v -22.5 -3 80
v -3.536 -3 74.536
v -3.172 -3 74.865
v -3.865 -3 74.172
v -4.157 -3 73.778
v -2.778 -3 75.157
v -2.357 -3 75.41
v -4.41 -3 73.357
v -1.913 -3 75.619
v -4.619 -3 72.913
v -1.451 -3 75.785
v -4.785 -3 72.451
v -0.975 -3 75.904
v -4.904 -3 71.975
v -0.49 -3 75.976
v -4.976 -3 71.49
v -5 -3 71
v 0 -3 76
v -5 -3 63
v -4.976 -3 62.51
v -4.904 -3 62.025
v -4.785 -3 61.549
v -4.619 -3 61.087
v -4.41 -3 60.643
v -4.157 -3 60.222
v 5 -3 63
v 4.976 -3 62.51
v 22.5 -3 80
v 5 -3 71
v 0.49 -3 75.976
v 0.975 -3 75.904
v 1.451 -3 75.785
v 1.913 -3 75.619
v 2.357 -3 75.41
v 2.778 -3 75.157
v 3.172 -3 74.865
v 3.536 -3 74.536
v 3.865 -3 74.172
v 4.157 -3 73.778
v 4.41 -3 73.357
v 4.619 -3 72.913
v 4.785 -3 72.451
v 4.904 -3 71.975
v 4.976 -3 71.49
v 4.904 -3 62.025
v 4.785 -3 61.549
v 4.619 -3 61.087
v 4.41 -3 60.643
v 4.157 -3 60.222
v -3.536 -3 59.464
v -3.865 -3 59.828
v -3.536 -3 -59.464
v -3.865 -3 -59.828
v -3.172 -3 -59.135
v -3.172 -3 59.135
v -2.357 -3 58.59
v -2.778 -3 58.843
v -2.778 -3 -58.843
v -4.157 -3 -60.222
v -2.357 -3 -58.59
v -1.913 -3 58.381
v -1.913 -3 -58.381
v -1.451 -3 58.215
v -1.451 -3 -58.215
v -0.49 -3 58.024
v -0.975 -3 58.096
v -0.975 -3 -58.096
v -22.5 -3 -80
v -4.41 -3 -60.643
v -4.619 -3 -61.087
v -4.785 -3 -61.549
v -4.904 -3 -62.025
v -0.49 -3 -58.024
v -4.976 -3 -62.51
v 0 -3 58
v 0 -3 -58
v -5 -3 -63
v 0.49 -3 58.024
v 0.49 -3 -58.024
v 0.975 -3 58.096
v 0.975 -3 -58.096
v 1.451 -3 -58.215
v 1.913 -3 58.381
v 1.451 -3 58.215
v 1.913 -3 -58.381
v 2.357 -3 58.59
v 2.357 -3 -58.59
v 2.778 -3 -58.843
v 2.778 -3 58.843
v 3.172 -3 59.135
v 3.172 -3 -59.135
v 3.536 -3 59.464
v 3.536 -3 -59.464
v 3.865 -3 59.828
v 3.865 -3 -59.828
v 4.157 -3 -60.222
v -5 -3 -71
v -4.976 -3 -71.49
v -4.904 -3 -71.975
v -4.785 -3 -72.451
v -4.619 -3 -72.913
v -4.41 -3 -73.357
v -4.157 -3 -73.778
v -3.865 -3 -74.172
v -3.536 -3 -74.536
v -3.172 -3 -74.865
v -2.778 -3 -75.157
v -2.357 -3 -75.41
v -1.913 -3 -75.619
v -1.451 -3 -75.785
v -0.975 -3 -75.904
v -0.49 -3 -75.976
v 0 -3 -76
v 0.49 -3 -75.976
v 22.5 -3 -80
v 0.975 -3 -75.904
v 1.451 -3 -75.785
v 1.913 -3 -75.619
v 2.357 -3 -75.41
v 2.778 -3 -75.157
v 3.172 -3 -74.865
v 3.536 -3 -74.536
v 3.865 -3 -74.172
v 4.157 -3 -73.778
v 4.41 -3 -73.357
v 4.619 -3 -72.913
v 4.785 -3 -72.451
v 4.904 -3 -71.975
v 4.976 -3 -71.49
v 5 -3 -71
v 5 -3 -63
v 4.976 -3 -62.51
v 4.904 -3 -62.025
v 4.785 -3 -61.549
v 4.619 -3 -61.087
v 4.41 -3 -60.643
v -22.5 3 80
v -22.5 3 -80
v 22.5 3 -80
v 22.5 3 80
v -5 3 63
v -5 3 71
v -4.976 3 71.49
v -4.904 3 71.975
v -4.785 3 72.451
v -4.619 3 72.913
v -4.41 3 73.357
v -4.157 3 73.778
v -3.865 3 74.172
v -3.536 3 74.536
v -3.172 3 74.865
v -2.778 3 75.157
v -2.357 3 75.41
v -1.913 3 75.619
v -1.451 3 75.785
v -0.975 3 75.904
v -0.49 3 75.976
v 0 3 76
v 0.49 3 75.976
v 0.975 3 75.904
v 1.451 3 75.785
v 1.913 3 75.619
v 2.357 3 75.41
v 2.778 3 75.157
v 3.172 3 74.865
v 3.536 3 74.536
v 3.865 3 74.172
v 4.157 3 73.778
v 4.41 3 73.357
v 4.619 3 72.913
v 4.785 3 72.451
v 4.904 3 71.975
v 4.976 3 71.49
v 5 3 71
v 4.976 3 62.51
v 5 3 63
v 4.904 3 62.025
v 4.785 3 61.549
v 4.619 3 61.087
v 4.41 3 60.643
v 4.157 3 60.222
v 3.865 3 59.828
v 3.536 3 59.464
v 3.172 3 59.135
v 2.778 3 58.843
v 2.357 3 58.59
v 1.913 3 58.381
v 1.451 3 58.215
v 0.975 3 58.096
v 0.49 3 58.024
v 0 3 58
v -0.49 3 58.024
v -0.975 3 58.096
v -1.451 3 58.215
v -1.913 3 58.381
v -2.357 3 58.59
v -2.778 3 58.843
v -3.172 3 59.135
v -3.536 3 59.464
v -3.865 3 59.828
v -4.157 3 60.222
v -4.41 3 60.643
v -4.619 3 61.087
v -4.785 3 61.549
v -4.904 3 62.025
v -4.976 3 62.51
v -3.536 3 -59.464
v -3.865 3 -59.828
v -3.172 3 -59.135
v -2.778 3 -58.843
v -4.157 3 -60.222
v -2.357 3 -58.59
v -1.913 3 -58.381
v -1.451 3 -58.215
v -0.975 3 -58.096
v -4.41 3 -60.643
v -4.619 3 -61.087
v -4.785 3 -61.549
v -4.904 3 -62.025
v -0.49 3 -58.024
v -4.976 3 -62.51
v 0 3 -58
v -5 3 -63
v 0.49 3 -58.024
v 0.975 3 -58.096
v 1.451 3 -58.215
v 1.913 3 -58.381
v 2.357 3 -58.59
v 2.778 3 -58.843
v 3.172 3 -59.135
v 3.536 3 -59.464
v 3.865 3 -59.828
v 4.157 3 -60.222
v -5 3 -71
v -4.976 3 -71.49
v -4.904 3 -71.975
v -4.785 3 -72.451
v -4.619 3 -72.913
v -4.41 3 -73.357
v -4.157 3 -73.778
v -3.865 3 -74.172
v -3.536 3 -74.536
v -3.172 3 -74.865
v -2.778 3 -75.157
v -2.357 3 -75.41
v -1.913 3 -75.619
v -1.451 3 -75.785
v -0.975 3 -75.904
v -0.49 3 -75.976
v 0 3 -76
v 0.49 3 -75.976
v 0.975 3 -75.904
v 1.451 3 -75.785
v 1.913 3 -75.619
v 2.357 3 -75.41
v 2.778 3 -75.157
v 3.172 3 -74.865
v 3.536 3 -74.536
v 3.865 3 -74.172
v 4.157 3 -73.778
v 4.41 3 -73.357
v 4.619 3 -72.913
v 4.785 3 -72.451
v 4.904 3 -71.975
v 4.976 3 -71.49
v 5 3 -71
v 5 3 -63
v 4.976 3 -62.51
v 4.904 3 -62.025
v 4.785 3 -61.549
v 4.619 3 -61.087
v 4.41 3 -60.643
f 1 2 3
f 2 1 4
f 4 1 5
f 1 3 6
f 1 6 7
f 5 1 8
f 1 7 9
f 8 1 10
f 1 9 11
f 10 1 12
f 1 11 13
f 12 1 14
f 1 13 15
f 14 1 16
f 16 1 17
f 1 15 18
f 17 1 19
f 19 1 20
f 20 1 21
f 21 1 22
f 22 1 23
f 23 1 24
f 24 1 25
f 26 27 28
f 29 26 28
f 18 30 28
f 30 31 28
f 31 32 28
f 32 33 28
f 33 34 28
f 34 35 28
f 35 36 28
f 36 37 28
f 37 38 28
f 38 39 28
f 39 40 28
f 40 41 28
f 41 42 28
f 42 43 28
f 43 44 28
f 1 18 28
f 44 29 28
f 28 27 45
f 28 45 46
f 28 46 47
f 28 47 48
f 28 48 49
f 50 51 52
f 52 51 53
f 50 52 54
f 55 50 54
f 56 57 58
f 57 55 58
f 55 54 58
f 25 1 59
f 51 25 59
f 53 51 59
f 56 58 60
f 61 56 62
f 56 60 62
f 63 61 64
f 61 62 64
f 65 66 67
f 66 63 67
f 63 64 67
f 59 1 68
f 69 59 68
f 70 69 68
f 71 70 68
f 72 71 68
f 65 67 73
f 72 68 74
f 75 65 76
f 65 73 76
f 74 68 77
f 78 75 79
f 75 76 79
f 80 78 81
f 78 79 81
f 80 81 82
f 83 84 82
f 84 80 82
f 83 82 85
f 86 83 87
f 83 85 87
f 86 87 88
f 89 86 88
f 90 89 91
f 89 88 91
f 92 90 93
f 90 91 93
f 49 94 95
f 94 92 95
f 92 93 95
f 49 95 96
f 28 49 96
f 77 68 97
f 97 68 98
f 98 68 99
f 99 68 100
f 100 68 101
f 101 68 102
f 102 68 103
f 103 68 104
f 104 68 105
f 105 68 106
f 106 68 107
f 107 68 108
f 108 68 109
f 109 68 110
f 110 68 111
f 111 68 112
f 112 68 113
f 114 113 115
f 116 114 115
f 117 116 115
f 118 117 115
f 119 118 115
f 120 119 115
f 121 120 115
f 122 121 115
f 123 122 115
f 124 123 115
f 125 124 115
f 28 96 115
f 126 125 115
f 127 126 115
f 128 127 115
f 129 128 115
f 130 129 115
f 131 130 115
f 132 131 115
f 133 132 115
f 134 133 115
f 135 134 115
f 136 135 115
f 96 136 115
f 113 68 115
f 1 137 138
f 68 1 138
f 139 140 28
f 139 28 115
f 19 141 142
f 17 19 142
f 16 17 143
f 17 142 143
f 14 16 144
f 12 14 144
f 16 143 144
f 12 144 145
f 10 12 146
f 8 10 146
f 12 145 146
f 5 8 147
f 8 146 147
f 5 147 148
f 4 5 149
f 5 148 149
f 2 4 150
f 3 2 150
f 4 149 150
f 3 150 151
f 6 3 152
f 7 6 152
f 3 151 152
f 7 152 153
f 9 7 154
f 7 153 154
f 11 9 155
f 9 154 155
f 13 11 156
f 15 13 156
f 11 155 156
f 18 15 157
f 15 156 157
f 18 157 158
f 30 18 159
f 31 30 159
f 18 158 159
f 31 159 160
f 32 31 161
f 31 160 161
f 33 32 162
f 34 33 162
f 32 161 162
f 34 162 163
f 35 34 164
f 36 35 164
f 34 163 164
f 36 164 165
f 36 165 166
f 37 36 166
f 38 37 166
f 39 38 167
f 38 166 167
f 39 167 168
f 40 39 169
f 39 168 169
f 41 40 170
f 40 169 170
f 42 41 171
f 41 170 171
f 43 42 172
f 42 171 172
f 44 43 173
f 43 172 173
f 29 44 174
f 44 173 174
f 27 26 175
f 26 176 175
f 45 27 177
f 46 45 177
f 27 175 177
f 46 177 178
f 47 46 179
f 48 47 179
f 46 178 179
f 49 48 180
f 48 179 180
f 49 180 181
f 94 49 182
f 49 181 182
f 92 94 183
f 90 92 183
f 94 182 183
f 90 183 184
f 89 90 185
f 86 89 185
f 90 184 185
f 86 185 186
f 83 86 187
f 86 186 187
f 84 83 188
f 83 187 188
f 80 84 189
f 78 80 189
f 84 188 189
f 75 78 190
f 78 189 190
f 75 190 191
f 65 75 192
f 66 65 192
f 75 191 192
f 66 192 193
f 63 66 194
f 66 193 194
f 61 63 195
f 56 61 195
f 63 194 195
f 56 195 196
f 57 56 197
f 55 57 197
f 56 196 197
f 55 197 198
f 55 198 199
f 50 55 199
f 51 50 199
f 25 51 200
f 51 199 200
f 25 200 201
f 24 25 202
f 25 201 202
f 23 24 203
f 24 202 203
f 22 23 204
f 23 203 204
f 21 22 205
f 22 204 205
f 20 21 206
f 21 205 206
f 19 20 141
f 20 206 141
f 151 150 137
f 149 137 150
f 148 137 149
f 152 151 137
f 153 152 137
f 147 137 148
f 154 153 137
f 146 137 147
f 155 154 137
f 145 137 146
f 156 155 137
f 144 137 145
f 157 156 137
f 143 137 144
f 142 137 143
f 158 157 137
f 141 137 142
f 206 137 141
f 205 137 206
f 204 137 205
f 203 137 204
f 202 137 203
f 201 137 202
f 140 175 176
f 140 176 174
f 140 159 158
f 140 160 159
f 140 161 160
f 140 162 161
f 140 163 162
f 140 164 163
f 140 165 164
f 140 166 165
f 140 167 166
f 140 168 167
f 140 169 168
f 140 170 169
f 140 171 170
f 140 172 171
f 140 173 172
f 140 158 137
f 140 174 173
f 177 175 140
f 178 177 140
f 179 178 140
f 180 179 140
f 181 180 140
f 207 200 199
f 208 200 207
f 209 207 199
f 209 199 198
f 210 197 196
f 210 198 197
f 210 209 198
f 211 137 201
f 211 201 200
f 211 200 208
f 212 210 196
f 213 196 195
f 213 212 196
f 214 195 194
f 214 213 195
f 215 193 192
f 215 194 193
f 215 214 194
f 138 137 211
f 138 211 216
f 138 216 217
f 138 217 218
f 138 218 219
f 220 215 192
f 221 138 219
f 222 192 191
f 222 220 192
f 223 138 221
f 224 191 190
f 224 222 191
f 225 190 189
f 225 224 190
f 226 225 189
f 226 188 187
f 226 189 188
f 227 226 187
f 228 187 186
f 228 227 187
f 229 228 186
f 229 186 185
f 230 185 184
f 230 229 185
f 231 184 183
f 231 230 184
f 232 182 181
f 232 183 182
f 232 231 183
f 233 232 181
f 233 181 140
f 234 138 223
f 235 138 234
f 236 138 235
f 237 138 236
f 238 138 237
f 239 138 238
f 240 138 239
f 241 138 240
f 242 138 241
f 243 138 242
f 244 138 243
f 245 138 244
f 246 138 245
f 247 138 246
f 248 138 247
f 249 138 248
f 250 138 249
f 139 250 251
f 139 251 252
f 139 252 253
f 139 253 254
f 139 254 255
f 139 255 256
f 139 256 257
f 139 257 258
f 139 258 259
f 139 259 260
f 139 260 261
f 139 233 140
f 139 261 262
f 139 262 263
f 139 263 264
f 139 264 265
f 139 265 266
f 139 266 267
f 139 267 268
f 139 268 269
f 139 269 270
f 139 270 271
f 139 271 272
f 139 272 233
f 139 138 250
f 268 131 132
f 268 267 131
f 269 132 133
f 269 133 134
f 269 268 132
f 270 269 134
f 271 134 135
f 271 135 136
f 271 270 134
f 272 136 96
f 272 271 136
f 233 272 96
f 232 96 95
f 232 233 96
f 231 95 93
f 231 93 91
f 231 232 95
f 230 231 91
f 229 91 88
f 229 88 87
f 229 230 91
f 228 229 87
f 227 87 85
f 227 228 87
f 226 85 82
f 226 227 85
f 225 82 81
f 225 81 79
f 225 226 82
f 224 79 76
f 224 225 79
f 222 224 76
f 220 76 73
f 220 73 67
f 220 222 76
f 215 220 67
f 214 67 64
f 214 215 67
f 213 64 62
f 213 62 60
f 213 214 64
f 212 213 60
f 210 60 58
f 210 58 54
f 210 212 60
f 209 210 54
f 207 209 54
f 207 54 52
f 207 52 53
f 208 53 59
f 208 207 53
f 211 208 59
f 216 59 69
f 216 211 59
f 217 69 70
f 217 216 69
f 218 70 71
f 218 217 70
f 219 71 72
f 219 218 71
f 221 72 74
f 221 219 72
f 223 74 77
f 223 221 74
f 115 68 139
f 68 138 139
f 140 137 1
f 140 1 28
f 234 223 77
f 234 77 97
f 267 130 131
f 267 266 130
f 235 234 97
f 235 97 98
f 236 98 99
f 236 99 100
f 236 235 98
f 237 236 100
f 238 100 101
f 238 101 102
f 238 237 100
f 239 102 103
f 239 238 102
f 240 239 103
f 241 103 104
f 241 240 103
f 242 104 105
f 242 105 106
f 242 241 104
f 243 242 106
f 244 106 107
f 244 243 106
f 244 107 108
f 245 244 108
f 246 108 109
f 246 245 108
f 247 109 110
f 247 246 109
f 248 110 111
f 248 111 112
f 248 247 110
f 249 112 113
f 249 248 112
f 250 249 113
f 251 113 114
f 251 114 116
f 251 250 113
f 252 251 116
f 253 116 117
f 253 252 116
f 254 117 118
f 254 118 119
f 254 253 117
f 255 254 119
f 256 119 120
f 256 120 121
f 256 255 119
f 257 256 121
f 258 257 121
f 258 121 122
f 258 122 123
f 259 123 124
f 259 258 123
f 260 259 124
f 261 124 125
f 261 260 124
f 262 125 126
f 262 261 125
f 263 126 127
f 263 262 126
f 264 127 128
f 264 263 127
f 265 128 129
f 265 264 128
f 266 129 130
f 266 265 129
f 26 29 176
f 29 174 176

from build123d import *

# Parameters (mm, degrees)
SKETCH_2_W      = 45
SKETCH_2_H      = 160
EXTRUDE_1_DEPTH = 3


with BuildPart() as part:
    # Эскиз2 → Бобышка-Вытянуть1 (new, symmetric)
    with BuildSketch(Plane(origin=(0, 0, 0), x_dir=(1, 0, 0), z_dir=(0, 1, 0))):
        Rectangle(SKETCH_2_W, SKETCH_2_H)
        with BuildLine():
            Line((-5, 63), (-5, 71))
            ThreePointArc((-5, 71), (0, 76), (5, 71))
            Line((5, 71), (5, 63))
            ThreePointArc((5, 63), (0, 58), (-5, 63))
        make_face(mode=Mode.SUBTRACT)
        with BuildLine():
            Line((-5, -63), (-5, -71))
            ThreePointArc((-5, -71), (0, -76), (5, -71))
            Line((5, -71), (5, -63))
            ThreePointArc((5, -63), (0, -58), (-5, -63))
        make_face(mode=Mode.SUBTRACT)
    extrude(amount=EXTRUDE_1_DEPTH, both=True)


solid = part.part
